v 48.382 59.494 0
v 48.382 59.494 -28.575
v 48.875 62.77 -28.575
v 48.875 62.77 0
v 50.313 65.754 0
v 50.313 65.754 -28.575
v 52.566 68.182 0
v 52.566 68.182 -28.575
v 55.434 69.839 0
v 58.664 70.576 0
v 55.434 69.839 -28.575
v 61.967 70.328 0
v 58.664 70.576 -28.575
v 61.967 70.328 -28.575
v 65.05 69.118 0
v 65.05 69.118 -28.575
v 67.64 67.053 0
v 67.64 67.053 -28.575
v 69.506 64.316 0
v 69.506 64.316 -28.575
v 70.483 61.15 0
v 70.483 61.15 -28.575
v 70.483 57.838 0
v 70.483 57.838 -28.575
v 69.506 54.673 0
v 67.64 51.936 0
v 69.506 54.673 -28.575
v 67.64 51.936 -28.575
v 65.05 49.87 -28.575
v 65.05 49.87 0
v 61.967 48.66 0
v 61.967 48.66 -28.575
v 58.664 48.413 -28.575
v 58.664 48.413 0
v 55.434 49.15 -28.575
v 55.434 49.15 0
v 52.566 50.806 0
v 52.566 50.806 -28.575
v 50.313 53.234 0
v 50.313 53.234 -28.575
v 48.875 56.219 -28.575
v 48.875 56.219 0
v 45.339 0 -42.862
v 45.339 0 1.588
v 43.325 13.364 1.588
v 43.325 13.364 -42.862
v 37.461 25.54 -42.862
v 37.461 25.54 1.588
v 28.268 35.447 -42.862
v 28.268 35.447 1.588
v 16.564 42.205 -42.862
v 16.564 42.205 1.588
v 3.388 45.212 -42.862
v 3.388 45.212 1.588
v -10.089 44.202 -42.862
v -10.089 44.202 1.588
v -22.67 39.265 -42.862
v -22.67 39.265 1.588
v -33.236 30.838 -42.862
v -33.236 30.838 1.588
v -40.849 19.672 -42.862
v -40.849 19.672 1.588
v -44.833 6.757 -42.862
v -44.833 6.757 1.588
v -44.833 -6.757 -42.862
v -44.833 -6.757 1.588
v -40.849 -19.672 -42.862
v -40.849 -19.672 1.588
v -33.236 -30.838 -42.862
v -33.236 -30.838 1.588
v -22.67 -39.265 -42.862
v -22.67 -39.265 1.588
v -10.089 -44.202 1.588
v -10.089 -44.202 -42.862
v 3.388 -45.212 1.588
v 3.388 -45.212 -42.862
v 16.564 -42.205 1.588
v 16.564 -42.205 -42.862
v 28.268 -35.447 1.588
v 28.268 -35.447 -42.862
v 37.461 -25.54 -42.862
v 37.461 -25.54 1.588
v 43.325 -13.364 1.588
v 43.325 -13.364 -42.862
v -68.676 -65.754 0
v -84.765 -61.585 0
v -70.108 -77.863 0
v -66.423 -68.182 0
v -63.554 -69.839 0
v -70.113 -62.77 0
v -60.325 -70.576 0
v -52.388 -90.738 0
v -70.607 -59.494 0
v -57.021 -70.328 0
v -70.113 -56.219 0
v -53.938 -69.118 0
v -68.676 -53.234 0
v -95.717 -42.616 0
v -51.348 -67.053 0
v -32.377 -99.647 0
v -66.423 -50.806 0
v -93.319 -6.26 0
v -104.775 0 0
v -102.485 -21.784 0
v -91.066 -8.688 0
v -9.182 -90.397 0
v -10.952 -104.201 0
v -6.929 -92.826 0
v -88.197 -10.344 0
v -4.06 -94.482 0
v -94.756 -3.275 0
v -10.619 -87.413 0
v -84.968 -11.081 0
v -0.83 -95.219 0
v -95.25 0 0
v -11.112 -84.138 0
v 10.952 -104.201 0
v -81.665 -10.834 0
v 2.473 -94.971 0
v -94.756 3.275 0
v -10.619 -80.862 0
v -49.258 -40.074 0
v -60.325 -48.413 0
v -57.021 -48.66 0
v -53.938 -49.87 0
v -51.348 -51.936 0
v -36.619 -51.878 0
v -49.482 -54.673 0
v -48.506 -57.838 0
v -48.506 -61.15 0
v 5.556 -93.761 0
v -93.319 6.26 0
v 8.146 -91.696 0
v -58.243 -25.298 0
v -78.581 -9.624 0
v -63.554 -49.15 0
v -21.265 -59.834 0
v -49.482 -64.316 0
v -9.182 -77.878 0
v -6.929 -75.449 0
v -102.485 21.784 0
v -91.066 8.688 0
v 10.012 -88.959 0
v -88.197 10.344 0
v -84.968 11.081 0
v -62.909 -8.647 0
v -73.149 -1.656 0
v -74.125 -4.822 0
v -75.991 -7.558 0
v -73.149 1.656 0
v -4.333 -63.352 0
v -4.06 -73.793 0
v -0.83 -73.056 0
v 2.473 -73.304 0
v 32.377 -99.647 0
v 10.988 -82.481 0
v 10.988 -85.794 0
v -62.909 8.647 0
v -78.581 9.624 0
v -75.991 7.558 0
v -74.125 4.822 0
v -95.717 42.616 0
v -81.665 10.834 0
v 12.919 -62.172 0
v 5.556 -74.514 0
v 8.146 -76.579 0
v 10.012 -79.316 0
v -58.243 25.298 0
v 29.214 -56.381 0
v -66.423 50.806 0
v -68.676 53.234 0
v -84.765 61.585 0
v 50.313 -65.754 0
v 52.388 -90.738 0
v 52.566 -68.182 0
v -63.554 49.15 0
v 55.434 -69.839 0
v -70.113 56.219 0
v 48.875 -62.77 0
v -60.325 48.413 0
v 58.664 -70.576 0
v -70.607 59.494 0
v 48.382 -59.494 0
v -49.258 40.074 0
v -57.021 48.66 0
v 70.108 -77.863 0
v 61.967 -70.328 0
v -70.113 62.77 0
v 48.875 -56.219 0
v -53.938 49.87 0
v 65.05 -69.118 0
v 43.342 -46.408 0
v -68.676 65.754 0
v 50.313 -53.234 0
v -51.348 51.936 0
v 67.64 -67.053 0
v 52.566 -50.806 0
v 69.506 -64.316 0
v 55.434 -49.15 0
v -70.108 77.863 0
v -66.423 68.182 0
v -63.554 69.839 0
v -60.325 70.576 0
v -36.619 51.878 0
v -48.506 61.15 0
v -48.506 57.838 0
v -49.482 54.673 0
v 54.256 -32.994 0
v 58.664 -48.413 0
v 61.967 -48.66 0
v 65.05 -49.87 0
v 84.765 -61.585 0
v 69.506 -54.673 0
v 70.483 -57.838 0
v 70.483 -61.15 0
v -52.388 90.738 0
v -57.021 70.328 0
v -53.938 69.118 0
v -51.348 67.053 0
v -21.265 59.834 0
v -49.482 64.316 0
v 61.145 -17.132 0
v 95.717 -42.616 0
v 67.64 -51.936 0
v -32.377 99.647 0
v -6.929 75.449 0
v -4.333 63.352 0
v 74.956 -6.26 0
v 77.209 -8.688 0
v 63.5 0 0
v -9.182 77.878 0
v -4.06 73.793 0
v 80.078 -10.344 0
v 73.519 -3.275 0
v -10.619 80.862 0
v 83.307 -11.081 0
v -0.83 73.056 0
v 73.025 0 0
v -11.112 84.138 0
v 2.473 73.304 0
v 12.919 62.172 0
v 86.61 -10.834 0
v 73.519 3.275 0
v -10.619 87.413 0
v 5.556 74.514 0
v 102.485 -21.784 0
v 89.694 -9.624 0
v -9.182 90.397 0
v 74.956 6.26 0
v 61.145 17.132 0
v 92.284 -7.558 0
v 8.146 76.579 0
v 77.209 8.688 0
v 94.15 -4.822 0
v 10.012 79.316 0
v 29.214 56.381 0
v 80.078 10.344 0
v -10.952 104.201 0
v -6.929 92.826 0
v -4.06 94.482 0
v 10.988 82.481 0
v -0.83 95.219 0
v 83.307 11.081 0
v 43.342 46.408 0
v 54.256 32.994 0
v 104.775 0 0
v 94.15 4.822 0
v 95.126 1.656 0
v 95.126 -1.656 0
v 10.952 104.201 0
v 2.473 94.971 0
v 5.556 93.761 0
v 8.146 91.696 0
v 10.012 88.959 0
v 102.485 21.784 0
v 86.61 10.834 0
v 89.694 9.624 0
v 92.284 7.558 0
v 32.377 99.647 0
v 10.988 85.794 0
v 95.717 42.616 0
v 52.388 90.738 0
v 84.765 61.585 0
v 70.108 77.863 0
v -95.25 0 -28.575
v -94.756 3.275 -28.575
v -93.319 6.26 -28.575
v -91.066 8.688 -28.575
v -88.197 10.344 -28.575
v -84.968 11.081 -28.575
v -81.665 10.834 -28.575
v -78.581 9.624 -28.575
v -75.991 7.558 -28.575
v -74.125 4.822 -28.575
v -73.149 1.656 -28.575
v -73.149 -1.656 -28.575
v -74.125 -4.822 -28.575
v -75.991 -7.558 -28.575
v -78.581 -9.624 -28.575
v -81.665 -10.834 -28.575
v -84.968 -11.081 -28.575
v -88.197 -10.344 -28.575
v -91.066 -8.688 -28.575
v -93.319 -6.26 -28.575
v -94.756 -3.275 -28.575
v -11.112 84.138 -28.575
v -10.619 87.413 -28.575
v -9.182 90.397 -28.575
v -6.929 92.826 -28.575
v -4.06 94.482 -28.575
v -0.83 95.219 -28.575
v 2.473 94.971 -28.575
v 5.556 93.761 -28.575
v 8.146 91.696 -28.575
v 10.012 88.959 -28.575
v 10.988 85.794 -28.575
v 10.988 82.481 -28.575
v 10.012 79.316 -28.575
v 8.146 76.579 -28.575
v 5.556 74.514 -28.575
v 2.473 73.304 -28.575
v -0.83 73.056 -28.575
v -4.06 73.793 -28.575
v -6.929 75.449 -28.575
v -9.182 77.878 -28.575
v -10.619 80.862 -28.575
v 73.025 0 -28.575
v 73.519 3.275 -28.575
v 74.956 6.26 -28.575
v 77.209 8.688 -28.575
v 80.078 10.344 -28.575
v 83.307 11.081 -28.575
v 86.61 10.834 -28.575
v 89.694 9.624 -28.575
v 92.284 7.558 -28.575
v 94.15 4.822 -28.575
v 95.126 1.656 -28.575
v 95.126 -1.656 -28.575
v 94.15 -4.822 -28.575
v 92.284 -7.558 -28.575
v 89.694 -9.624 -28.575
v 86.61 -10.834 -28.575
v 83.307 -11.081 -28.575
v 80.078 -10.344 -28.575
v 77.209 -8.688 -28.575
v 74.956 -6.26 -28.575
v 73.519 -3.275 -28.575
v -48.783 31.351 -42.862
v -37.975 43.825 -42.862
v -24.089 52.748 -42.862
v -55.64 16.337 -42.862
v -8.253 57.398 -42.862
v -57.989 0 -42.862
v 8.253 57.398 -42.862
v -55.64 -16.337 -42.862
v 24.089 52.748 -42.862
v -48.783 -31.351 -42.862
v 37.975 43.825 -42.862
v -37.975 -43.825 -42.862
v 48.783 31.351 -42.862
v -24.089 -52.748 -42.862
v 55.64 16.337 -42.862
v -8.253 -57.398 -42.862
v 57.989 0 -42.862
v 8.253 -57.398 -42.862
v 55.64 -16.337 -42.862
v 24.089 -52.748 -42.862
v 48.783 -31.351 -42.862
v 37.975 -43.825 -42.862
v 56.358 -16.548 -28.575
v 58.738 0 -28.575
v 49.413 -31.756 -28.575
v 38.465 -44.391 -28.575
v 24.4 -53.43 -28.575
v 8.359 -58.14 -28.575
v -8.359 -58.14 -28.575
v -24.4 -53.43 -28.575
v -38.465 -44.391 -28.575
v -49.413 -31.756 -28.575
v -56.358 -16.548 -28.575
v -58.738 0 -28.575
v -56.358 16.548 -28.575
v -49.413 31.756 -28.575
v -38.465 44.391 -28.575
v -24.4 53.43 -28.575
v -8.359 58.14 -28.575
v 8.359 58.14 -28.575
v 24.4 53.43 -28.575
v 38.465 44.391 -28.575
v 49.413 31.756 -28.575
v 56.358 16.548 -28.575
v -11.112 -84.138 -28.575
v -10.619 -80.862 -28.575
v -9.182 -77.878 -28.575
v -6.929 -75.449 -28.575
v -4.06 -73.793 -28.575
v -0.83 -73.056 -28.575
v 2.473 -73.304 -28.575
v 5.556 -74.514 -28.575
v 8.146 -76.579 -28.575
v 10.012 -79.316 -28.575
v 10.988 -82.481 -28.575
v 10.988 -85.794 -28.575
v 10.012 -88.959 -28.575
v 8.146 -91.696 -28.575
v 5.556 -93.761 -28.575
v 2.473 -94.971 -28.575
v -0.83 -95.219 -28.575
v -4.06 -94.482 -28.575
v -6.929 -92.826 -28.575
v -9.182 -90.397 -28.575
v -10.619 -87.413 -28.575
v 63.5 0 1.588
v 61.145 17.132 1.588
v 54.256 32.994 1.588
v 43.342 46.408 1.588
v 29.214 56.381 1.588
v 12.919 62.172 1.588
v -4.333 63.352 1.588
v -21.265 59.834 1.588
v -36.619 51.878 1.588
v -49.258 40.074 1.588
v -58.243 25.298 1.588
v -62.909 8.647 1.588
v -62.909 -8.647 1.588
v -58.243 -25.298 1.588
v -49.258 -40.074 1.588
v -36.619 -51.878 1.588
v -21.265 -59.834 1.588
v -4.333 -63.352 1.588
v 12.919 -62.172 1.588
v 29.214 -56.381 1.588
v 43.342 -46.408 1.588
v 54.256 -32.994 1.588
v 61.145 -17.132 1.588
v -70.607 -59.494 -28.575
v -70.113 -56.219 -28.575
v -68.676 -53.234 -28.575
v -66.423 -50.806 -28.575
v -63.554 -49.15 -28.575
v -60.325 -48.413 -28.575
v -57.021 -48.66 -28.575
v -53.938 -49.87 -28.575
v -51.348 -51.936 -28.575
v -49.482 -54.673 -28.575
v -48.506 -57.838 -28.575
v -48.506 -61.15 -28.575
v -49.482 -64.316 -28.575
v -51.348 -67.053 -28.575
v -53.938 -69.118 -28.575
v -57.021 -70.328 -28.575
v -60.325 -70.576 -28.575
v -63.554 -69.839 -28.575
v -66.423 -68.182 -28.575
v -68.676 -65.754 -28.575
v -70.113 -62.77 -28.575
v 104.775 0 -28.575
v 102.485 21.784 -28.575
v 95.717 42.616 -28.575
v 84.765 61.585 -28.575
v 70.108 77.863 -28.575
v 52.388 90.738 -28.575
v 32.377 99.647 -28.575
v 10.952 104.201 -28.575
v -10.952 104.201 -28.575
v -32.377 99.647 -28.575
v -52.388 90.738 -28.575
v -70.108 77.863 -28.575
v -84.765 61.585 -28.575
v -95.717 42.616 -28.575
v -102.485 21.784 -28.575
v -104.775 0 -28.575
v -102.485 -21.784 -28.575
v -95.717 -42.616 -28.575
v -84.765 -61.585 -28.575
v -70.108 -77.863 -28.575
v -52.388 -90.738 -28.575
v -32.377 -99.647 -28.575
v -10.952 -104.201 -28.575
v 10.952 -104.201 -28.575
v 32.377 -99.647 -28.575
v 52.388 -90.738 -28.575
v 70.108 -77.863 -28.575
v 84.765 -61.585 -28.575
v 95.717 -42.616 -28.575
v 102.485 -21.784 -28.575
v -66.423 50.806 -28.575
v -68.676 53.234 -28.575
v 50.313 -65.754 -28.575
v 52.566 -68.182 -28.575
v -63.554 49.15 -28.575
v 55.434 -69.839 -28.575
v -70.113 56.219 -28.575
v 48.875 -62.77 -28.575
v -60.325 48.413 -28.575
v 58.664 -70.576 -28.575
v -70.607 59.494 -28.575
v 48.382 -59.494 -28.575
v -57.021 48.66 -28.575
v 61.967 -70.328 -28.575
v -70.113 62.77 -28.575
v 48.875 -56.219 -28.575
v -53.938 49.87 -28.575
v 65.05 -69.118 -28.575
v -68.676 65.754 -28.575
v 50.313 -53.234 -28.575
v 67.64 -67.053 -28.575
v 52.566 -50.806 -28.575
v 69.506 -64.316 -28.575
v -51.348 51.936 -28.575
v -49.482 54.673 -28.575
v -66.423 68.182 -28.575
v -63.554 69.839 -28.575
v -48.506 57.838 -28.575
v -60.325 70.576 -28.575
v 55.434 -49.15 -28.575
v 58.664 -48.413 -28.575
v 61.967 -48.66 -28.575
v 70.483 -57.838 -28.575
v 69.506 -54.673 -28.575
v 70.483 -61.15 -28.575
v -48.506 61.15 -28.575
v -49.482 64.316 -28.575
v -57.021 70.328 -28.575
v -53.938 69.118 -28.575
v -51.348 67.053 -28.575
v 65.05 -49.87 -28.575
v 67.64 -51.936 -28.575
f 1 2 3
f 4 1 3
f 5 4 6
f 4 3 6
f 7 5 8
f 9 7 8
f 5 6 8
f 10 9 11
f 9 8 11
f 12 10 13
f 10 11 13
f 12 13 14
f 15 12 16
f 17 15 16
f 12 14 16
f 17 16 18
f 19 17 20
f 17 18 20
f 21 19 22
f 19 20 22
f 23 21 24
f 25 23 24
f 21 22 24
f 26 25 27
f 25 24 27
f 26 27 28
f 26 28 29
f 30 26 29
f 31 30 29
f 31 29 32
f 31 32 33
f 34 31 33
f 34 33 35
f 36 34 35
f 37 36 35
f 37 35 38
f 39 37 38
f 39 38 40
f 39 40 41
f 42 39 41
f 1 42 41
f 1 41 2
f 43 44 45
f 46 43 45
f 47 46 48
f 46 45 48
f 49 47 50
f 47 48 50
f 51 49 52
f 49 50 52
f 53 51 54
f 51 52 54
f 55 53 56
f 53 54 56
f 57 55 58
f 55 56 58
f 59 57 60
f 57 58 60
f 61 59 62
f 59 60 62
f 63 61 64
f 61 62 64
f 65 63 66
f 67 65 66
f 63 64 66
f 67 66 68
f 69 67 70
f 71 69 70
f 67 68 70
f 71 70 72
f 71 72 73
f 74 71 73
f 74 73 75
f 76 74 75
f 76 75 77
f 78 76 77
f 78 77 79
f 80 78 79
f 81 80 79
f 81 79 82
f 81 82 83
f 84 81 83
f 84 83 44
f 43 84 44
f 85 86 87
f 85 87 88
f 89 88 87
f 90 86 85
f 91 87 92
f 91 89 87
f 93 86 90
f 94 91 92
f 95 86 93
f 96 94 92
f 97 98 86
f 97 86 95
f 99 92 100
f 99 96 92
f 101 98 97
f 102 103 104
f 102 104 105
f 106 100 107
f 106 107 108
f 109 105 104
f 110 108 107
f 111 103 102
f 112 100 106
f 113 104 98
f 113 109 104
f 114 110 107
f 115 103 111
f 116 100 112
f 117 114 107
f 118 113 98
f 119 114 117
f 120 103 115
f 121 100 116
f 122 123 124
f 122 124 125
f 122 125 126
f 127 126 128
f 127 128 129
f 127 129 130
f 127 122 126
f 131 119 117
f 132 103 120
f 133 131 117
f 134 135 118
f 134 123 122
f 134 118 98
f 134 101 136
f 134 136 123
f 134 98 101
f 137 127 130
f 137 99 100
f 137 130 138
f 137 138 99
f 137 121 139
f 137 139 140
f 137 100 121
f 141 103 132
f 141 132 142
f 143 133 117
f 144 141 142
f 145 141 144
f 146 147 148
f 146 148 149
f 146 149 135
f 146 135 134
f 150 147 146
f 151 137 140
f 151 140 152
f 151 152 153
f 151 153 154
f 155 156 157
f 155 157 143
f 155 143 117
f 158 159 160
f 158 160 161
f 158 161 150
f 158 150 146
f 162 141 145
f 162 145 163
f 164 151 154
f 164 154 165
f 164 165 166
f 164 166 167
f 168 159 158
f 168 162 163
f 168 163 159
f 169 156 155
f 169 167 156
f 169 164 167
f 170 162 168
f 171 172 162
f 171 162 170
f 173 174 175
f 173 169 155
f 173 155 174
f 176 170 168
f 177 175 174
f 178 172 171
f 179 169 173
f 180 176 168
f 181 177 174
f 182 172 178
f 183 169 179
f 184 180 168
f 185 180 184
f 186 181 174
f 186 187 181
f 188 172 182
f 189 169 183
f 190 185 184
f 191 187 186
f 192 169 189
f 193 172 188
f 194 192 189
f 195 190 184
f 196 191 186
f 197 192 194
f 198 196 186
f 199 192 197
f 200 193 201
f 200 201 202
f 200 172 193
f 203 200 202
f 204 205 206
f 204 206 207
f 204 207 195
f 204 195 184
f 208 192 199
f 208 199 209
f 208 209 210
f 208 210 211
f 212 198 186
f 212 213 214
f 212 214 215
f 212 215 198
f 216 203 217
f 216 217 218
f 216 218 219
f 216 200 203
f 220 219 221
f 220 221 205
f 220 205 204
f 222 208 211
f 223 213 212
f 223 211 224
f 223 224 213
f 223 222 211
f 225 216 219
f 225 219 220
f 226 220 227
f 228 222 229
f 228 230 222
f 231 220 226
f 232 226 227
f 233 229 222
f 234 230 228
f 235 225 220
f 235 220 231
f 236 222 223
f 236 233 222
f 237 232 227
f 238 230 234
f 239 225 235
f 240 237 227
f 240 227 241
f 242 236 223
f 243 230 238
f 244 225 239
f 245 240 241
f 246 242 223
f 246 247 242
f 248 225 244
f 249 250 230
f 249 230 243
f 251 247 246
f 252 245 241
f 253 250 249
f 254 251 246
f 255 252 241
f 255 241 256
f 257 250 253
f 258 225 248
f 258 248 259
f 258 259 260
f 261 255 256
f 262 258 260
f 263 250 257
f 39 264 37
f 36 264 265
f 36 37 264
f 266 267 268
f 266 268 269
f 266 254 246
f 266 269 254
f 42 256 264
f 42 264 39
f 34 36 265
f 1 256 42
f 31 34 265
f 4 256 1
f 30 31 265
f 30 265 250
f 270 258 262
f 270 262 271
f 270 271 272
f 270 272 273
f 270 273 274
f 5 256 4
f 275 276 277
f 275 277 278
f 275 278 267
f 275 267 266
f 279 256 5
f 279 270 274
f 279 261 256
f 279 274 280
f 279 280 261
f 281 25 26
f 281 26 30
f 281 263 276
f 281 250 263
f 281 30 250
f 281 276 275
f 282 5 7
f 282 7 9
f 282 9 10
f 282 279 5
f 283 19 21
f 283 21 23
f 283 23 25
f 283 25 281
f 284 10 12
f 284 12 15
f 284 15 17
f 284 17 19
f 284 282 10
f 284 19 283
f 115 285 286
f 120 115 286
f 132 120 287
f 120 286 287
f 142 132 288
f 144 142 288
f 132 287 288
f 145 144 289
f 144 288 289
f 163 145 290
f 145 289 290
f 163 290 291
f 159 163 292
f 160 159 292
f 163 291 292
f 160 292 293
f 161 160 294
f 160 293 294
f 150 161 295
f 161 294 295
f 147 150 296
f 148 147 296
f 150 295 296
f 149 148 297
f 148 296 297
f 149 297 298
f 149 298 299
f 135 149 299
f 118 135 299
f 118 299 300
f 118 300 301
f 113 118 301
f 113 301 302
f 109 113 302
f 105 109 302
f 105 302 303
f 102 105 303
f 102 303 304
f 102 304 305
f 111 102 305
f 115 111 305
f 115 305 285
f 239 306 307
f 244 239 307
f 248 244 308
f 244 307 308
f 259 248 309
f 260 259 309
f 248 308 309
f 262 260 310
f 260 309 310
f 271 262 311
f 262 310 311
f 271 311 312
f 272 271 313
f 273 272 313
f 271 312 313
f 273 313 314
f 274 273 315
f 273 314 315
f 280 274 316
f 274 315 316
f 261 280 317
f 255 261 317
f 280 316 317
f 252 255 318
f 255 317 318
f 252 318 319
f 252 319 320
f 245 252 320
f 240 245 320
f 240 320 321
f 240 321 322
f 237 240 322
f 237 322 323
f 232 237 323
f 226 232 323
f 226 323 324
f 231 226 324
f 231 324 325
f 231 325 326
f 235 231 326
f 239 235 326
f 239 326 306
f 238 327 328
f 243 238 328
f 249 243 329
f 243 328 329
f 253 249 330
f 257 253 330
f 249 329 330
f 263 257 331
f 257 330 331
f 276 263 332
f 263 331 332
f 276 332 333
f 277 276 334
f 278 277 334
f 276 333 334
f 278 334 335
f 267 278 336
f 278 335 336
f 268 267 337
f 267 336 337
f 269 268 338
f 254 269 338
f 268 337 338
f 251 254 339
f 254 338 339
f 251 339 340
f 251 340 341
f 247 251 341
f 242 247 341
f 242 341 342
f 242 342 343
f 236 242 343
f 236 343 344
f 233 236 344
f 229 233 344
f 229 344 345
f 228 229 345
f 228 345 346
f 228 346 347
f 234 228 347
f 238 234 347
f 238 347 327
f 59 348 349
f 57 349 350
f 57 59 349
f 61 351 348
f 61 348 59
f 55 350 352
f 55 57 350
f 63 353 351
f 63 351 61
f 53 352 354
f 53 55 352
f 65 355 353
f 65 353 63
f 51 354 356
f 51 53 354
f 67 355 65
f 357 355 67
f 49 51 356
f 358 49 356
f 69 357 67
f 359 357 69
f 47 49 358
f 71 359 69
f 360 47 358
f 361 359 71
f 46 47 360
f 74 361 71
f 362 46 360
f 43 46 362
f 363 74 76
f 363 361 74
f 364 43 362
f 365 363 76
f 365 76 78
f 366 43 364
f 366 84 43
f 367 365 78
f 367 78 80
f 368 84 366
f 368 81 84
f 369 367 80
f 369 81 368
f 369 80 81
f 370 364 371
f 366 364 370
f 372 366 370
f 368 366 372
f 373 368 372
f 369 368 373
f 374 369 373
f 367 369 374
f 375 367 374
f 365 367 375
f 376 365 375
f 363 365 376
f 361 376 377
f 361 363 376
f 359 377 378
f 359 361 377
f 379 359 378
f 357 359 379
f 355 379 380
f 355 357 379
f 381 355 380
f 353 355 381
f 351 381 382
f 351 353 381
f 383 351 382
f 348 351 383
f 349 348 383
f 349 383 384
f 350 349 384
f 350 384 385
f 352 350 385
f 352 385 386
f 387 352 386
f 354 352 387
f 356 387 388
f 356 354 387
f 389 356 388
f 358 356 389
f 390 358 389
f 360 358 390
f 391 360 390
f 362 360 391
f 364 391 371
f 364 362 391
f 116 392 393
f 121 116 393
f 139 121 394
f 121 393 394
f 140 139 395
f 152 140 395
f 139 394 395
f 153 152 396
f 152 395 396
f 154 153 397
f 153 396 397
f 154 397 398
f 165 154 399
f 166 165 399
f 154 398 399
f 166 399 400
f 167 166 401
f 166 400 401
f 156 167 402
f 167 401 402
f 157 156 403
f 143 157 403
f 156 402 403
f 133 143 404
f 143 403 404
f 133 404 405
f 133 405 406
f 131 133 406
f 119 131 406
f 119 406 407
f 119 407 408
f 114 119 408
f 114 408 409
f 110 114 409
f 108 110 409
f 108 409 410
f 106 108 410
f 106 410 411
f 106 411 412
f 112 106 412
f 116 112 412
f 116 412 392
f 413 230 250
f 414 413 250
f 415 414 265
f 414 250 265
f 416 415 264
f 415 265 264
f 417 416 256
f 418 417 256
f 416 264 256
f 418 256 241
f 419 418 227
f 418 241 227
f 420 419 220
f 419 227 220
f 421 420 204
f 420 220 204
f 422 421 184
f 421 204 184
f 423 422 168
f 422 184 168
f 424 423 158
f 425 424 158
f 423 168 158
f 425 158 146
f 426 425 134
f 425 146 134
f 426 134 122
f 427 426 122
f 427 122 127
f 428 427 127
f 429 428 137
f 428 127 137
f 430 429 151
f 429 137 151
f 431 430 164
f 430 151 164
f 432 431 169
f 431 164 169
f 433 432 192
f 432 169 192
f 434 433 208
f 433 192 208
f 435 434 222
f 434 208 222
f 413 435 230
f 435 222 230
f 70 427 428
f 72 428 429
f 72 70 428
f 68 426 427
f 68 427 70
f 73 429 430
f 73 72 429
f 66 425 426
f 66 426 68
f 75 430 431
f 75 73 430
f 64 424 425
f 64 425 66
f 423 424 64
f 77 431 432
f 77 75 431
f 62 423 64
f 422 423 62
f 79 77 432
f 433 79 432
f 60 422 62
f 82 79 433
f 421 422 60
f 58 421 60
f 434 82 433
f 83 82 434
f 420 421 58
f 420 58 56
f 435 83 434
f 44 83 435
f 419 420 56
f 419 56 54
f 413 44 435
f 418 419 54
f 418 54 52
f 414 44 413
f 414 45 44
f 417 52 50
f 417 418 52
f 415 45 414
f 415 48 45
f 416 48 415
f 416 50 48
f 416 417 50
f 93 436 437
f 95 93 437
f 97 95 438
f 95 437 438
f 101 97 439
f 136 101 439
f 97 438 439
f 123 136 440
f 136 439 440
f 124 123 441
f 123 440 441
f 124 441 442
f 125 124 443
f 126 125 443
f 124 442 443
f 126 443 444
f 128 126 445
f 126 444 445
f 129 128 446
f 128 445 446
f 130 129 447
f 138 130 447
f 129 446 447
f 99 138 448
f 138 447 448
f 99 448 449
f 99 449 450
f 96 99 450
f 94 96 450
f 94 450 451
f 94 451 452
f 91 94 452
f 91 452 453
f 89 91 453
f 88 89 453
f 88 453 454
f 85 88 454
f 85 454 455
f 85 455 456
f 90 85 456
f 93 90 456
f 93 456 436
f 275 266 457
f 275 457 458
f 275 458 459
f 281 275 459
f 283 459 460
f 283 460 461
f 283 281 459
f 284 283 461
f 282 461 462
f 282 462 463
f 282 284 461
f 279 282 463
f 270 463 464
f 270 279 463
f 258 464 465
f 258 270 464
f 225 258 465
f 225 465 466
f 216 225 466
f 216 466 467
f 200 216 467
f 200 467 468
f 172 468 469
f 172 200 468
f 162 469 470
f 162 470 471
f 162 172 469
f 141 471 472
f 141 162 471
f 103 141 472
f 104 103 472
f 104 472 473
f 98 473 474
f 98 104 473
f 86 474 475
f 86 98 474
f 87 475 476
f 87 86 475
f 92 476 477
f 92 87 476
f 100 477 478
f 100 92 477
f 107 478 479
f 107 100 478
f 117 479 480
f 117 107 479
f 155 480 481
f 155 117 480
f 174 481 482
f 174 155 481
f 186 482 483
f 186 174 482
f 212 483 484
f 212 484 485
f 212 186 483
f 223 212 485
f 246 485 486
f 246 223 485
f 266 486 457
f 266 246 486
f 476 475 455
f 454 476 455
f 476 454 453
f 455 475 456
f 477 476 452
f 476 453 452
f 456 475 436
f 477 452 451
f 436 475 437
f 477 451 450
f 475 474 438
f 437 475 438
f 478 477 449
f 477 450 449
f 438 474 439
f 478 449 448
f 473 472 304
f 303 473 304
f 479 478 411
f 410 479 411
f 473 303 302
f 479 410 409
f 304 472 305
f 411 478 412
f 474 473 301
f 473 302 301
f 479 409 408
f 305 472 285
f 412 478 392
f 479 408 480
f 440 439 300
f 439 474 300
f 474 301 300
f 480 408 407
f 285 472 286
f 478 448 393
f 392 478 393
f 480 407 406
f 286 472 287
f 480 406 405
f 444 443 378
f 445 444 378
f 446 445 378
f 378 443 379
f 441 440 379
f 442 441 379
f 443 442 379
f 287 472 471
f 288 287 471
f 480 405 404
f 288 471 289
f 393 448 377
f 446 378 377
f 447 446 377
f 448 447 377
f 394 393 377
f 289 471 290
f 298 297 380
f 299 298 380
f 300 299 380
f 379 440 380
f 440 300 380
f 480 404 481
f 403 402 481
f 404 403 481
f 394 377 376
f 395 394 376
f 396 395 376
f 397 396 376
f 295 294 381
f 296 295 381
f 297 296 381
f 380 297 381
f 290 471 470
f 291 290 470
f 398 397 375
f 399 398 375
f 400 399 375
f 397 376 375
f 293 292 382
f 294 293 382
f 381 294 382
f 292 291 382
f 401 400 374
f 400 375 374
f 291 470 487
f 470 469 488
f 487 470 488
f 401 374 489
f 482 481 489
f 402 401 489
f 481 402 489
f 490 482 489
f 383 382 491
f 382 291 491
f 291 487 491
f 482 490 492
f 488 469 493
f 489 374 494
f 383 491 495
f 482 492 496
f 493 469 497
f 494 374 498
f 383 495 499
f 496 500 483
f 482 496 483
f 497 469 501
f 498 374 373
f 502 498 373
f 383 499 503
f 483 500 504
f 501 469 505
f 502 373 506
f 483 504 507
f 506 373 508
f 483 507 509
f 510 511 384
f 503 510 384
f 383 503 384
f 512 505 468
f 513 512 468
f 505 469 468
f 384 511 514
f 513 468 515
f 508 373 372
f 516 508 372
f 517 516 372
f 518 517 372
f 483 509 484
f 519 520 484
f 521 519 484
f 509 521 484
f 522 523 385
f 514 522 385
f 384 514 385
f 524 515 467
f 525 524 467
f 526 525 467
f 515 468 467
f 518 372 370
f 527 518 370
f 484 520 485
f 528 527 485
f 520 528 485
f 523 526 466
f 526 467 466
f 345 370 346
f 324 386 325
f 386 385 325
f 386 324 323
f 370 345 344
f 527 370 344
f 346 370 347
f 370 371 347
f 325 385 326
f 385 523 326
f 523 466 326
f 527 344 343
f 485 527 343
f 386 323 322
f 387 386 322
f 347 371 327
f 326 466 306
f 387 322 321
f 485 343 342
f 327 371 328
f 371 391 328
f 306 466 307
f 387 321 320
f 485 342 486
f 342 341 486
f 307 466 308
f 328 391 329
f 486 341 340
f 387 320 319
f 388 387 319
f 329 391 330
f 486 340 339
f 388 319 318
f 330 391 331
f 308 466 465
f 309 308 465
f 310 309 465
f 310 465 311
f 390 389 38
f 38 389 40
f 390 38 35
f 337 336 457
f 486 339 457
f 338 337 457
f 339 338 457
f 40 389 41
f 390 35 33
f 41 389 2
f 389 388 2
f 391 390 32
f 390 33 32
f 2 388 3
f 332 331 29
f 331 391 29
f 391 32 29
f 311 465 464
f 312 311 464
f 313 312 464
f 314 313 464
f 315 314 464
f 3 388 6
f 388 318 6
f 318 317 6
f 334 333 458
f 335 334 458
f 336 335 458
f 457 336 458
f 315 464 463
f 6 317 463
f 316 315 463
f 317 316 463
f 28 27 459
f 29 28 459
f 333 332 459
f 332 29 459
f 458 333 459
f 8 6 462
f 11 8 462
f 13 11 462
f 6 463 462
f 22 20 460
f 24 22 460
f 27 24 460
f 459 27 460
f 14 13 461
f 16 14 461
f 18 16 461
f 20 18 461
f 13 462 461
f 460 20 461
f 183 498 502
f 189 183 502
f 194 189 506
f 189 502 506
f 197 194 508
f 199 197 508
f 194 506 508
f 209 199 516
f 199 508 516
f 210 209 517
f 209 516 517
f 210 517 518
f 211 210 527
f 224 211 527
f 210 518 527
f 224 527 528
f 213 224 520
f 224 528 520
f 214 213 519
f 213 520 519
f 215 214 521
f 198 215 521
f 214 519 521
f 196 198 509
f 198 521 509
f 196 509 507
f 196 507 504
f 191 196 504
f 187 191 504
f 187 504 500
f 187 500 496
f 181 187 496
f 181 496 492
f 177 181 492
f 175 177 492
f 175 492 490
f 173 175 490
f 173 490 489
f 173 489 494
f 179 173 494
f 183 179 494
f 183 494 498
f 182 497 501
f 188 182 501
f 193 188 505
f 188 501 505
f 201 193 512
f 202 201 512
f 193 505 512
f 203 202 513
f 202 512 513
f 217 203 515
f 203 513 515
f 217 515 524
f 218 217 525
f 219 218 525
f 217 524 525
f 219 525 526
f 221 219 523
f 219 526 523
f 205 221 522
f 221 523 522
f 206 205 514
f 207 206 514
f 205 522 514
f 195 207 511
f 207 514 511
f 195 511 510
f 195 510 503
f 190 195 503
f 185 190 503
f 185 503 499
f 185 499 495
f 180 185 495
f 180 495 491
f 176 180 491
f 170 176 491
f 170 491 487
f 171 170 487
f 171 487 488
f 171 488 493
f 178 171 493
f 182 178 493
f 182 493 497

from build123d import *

# Parameters (mm, degrees)
F0_R     = 104.775
F1_DEPTH = 28.575
F2_R     = 63.5
F3_DEPTH = 1.5875
F4_R     = 58.7375
F5_DEPTH = 14.2875
F5_TAPER = 3
F6_R     = 45.339
F7_DEPTH = 44.4510001
F9_D     = 22.225


with BuildPart() as f1:
    # F0 (on Top) → F1 (new body)
    with BuildSketch(Plane.XY):
        Circle(F0_R)
    extrude(amount=-F1_DEPTH)

    # F2 (on face) → F3 (join)
    with BuildSketch(Plane.XY):
        Circle(F2_R)
    extrude(amount=F3_DEPTH)

    # F4 (on face) → F5 (join)
    with BuildSketch(Plane(origin=(0, 0, -28.575), x_dir=(1, 0, 0), z_dir=(0, 0, -1))):
        Circle(F4_R)
    extrude(amount=F5_DEPTH, taper=F5_TAPER)

    # F6 (on face) → F7 (cut, through all)
    with BuildSketch(Plane.XY.offset(1.5875)):
        Circle(F6_R)
    extrude(amount=-F7_DEPTH, mode=Mode.SUBTRACT)

    # F9 (through all)
    with Locations(Plane.XY):
        with Locations((84.1375, 0), (59.4941968021, 59.4941968021), (0, 84.1375), (-59.4941968021, 59.4941968021), (-84.1375, 0), (-59.4941968021, -59.4941968021), (0, -84.1375), (59.4941968021, -59.4941968021)):
            Hole(F9_D / 2)


solid = f1.part
